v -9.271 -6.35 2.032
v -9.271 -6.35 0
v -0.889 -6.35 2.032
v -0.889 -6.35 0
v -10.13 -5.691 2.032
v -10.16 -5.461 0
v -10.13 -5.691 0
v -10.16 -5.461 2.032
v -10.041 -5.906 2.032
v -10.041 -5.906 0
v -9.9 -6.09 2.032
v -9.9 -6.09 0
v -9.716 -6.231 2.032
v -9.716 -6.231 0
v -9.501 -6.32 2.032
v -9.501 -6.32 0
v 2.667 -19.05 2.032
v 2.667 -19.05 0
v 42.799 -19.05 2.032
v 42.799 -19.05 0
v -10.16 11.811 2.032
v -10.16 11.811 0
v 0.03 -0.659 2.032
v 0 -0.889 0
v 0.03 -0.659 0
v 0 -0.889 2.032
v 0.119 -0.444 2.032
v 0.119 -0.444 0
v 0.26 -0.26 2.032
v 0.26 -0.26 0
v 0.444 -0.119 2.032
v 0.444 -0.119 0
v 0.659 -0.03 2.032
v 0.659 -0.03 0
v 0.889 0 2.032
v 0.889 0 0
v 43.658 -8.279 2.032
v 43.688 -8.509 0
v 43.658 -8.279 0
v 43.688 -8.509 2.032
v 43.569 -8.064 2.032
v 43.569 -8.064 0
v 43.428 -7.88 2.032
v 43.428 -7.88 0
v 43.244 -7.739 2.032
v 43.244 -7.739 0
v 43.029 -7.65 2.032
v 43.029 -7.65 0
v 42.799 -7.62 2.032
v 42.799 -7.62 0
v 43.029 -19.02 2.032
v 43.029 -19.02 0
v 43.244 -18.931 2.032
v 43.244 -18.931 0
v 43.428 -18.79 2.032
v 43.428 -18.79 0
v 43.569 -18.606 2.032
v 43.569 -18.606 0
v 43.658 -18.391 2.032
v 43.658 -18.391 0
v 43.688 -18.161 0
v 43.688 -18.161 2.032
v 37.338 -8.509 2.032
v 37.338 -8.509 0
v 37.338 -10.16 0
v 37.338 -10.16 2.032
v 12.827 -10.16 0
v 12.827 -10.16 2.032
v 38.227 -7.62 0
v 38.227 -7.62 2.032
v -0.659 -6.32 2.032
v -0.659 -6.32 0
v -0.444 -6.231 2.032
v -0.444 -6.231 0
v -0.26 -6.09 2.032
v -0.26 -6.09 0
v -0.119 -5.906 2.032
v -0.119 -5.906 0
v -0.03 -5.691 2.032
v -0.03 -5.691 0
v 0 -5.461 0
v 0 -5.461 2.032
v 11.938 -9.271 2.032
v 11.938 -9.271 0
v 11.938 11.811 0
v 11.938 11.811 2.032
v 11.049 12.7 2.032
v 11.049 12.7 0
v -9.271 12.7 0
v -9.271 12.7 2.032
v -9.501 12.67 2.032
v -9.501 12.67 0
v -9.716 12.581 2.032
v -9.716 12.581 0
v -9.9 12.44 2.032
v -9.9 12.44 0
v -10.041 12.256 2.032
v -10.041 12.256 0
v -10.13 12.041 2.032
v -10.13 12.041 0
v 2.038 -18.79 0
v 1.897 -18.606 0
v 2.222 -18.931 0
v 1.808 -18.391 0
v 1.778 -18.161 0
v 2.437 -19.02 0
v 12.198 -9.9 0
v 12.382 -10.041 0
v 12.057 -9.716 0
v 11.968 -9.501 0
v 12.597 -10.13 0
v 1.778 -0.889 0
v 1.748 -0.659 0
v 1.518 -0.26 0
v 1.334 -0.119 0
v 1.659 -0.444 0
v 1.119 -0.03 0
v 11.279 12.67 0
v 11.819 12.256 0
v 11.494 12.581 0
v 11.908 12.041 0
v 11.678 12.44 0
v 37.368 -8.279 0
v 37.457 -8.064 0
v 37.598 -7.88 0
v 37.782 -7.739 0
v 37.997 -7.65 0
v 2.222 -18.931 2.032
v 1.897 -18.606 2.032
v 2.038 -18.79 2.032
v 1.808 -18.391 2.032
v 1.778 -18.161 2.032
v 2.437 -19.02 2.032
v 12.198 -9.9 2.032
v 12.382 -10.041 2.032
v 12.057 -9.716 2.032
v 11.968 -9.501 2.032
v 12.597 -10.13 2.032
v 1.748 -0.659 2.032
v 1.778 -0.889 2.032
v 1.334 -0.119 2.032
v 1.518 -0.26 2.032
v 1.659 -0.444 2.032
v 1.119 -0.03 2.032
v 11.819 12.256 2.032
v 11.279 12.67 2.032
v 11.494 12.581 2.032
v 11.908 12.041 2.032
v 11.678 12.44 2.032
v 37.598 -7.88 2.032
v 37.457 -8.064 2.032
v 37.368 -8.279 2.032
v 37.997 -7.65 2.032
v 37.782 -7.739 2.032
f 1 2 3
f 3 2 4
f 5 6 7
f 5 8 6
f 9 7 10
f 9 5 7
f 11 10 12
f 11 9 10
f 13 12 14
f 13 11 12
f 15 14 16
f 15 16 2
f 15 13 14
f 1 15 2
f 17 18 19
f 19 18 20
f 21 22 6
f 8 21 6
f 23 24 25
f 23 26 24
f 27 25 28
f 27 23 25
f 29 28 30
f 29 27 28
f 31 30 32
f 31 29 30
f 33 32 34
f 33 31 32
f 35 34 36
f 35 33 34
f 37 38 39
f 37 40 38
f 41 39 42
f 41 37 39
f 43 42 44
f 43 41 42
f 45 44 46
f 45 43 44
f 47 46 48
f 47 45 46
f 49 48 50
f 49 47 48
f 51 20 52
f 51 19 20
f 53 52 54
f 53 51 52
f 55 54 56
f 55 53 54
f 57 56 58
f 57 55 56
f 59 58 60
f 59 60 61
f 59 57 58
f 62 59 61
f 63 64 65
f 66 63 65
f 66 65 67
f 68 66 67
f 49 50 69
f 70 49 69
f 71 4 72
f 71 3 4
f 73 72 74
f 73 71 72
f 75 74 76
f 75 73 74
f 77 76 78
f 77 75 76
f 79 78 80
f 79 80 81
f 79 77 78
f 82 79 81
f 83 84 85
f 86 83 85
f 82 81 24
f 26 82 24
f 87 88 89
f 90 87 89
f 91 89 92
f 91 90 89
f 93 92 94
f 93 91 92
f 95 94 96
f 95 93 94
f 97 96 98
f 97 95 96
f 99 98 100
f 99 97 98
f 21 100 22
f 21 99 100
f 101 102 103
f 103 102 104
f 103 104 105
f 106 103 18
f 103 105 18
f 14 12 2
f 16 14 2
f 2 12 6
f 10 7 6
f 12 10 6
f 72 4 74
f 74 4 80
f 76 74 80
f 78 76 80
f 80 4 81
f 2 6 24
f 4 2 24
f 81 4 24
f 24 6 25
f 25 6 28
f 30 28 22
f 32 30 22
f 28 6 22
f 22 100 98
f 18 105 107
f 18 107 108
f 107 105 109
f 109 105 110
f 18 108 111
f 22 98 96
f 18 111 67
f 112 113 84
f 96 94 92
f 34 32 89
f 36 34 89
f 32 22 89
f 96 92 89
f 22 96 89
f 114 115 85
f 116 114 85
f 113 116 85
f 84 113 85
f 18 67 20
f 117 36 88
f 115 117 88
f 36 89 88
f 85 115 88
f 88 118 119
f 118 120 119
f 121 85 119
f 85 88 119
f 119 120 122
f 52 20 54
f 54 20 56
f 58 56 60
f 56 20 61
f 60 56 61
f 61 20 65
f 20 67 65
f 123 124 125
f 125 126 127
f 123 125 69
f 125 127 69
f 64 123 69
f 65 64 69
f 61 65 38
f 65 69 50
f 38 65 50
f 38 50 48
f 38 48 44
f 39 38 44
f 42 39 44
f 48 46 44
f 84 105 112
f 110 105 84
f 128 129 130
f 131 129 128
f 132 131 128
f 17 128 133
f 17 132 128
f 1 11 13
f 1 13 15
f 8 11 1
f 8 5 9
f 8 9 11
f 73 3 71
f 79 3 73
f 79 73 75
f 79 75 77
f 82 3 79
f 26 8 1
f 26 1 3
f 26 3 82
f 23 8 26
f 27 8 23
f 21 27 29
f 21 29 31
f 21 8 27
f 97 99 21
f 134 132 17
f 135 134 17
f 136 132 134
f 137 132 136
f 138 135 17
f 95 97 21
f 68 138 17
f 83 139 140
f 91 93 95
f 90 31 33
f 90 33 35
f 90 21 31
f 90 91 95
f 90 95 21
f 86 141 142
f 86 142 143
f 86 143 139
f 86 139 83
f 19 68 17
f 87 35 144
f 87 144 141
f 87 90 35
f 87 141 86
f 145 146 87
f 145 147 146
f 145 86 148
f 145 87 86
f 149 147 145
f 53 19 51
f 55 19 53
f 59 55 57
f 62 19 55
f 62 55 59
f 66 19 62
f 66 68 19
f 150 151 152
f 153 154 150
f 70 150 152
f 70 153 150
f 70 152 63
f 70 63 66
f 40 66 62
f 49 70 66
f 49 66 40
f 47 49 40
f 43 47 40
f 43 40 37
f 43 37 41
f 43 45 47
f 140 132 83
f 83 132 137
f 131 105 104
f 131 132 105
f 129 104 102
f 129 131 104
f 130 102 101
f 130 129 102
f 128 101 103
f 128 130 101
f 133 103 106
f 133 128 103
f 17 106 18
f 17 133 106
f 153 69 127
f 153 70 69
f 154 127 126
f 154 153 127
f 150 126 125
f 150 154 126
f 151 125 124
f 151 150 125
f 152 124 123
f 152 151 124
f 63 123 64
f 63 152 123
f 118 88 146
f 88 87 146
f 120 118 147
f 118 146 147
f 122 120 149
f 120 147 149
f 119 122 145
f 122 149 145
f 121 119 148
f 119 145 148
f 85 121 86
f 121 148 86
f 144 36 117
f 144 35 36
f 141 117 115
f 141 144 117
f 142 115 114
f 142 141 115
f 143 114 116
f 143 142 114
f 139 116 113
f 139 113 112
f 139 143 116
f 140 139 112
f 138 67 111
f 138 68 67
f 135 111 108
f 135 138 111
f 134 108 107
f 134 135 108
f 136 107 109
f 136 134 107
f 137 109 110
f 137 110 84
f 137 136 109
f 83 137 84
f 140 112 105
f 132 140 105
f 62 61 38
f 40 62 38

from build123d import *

# Parameters (mm, degrees)
F1_DEPTH = 2.032
F2_R     = 0.88899


# Not quite as in the source:
# - a fillet or chamfer is up to 0.001 mm smaller than in the source, because OpenCascade refuses the exact size


with BuildPart() as f1:
    # F0 (on Top) → F1 (new body)
    with BuildSketch(Plane.XY):
        Polygon((11.938, 12.7), (-10.16, 12.7), (-10.16, -6.35), (0, -6.35), (0, 0), (1.778, 0), (1.778, -19.05), (43.688, -19.05), (43.688, -7.62), (37.338, -7.62), (37.338, -10.16), (11.938, -10.16), align=None)
    extrude(amount=F1_DEPTH)

    # F2 (radius 0.889 in the source; OpenCascade refuses exactly that, so slightly less here)
    f2_edges = [f1.edges().sort_by_distance(p)[0] for p in [
        (-10.16, -6.35, 1.016),
        (0, -6.35, 1.016),
        (0, 0, 1.016),
        (1.778, 0, 1.016),
        (1.778, -19.05, 1.016),
        (-10.16, 12.7, 1.016),
        (37.338, -7.62, 1.016),
        (43.688, -19.05, 1.016),
        (11.938, 12.7, 1.016),
        (11.938, -10.16, 1.016),
        (43.688, -7.62, 1.016),
    ]]
    fillet(f2_edges, radius=F2_R)


solid = f1.part
